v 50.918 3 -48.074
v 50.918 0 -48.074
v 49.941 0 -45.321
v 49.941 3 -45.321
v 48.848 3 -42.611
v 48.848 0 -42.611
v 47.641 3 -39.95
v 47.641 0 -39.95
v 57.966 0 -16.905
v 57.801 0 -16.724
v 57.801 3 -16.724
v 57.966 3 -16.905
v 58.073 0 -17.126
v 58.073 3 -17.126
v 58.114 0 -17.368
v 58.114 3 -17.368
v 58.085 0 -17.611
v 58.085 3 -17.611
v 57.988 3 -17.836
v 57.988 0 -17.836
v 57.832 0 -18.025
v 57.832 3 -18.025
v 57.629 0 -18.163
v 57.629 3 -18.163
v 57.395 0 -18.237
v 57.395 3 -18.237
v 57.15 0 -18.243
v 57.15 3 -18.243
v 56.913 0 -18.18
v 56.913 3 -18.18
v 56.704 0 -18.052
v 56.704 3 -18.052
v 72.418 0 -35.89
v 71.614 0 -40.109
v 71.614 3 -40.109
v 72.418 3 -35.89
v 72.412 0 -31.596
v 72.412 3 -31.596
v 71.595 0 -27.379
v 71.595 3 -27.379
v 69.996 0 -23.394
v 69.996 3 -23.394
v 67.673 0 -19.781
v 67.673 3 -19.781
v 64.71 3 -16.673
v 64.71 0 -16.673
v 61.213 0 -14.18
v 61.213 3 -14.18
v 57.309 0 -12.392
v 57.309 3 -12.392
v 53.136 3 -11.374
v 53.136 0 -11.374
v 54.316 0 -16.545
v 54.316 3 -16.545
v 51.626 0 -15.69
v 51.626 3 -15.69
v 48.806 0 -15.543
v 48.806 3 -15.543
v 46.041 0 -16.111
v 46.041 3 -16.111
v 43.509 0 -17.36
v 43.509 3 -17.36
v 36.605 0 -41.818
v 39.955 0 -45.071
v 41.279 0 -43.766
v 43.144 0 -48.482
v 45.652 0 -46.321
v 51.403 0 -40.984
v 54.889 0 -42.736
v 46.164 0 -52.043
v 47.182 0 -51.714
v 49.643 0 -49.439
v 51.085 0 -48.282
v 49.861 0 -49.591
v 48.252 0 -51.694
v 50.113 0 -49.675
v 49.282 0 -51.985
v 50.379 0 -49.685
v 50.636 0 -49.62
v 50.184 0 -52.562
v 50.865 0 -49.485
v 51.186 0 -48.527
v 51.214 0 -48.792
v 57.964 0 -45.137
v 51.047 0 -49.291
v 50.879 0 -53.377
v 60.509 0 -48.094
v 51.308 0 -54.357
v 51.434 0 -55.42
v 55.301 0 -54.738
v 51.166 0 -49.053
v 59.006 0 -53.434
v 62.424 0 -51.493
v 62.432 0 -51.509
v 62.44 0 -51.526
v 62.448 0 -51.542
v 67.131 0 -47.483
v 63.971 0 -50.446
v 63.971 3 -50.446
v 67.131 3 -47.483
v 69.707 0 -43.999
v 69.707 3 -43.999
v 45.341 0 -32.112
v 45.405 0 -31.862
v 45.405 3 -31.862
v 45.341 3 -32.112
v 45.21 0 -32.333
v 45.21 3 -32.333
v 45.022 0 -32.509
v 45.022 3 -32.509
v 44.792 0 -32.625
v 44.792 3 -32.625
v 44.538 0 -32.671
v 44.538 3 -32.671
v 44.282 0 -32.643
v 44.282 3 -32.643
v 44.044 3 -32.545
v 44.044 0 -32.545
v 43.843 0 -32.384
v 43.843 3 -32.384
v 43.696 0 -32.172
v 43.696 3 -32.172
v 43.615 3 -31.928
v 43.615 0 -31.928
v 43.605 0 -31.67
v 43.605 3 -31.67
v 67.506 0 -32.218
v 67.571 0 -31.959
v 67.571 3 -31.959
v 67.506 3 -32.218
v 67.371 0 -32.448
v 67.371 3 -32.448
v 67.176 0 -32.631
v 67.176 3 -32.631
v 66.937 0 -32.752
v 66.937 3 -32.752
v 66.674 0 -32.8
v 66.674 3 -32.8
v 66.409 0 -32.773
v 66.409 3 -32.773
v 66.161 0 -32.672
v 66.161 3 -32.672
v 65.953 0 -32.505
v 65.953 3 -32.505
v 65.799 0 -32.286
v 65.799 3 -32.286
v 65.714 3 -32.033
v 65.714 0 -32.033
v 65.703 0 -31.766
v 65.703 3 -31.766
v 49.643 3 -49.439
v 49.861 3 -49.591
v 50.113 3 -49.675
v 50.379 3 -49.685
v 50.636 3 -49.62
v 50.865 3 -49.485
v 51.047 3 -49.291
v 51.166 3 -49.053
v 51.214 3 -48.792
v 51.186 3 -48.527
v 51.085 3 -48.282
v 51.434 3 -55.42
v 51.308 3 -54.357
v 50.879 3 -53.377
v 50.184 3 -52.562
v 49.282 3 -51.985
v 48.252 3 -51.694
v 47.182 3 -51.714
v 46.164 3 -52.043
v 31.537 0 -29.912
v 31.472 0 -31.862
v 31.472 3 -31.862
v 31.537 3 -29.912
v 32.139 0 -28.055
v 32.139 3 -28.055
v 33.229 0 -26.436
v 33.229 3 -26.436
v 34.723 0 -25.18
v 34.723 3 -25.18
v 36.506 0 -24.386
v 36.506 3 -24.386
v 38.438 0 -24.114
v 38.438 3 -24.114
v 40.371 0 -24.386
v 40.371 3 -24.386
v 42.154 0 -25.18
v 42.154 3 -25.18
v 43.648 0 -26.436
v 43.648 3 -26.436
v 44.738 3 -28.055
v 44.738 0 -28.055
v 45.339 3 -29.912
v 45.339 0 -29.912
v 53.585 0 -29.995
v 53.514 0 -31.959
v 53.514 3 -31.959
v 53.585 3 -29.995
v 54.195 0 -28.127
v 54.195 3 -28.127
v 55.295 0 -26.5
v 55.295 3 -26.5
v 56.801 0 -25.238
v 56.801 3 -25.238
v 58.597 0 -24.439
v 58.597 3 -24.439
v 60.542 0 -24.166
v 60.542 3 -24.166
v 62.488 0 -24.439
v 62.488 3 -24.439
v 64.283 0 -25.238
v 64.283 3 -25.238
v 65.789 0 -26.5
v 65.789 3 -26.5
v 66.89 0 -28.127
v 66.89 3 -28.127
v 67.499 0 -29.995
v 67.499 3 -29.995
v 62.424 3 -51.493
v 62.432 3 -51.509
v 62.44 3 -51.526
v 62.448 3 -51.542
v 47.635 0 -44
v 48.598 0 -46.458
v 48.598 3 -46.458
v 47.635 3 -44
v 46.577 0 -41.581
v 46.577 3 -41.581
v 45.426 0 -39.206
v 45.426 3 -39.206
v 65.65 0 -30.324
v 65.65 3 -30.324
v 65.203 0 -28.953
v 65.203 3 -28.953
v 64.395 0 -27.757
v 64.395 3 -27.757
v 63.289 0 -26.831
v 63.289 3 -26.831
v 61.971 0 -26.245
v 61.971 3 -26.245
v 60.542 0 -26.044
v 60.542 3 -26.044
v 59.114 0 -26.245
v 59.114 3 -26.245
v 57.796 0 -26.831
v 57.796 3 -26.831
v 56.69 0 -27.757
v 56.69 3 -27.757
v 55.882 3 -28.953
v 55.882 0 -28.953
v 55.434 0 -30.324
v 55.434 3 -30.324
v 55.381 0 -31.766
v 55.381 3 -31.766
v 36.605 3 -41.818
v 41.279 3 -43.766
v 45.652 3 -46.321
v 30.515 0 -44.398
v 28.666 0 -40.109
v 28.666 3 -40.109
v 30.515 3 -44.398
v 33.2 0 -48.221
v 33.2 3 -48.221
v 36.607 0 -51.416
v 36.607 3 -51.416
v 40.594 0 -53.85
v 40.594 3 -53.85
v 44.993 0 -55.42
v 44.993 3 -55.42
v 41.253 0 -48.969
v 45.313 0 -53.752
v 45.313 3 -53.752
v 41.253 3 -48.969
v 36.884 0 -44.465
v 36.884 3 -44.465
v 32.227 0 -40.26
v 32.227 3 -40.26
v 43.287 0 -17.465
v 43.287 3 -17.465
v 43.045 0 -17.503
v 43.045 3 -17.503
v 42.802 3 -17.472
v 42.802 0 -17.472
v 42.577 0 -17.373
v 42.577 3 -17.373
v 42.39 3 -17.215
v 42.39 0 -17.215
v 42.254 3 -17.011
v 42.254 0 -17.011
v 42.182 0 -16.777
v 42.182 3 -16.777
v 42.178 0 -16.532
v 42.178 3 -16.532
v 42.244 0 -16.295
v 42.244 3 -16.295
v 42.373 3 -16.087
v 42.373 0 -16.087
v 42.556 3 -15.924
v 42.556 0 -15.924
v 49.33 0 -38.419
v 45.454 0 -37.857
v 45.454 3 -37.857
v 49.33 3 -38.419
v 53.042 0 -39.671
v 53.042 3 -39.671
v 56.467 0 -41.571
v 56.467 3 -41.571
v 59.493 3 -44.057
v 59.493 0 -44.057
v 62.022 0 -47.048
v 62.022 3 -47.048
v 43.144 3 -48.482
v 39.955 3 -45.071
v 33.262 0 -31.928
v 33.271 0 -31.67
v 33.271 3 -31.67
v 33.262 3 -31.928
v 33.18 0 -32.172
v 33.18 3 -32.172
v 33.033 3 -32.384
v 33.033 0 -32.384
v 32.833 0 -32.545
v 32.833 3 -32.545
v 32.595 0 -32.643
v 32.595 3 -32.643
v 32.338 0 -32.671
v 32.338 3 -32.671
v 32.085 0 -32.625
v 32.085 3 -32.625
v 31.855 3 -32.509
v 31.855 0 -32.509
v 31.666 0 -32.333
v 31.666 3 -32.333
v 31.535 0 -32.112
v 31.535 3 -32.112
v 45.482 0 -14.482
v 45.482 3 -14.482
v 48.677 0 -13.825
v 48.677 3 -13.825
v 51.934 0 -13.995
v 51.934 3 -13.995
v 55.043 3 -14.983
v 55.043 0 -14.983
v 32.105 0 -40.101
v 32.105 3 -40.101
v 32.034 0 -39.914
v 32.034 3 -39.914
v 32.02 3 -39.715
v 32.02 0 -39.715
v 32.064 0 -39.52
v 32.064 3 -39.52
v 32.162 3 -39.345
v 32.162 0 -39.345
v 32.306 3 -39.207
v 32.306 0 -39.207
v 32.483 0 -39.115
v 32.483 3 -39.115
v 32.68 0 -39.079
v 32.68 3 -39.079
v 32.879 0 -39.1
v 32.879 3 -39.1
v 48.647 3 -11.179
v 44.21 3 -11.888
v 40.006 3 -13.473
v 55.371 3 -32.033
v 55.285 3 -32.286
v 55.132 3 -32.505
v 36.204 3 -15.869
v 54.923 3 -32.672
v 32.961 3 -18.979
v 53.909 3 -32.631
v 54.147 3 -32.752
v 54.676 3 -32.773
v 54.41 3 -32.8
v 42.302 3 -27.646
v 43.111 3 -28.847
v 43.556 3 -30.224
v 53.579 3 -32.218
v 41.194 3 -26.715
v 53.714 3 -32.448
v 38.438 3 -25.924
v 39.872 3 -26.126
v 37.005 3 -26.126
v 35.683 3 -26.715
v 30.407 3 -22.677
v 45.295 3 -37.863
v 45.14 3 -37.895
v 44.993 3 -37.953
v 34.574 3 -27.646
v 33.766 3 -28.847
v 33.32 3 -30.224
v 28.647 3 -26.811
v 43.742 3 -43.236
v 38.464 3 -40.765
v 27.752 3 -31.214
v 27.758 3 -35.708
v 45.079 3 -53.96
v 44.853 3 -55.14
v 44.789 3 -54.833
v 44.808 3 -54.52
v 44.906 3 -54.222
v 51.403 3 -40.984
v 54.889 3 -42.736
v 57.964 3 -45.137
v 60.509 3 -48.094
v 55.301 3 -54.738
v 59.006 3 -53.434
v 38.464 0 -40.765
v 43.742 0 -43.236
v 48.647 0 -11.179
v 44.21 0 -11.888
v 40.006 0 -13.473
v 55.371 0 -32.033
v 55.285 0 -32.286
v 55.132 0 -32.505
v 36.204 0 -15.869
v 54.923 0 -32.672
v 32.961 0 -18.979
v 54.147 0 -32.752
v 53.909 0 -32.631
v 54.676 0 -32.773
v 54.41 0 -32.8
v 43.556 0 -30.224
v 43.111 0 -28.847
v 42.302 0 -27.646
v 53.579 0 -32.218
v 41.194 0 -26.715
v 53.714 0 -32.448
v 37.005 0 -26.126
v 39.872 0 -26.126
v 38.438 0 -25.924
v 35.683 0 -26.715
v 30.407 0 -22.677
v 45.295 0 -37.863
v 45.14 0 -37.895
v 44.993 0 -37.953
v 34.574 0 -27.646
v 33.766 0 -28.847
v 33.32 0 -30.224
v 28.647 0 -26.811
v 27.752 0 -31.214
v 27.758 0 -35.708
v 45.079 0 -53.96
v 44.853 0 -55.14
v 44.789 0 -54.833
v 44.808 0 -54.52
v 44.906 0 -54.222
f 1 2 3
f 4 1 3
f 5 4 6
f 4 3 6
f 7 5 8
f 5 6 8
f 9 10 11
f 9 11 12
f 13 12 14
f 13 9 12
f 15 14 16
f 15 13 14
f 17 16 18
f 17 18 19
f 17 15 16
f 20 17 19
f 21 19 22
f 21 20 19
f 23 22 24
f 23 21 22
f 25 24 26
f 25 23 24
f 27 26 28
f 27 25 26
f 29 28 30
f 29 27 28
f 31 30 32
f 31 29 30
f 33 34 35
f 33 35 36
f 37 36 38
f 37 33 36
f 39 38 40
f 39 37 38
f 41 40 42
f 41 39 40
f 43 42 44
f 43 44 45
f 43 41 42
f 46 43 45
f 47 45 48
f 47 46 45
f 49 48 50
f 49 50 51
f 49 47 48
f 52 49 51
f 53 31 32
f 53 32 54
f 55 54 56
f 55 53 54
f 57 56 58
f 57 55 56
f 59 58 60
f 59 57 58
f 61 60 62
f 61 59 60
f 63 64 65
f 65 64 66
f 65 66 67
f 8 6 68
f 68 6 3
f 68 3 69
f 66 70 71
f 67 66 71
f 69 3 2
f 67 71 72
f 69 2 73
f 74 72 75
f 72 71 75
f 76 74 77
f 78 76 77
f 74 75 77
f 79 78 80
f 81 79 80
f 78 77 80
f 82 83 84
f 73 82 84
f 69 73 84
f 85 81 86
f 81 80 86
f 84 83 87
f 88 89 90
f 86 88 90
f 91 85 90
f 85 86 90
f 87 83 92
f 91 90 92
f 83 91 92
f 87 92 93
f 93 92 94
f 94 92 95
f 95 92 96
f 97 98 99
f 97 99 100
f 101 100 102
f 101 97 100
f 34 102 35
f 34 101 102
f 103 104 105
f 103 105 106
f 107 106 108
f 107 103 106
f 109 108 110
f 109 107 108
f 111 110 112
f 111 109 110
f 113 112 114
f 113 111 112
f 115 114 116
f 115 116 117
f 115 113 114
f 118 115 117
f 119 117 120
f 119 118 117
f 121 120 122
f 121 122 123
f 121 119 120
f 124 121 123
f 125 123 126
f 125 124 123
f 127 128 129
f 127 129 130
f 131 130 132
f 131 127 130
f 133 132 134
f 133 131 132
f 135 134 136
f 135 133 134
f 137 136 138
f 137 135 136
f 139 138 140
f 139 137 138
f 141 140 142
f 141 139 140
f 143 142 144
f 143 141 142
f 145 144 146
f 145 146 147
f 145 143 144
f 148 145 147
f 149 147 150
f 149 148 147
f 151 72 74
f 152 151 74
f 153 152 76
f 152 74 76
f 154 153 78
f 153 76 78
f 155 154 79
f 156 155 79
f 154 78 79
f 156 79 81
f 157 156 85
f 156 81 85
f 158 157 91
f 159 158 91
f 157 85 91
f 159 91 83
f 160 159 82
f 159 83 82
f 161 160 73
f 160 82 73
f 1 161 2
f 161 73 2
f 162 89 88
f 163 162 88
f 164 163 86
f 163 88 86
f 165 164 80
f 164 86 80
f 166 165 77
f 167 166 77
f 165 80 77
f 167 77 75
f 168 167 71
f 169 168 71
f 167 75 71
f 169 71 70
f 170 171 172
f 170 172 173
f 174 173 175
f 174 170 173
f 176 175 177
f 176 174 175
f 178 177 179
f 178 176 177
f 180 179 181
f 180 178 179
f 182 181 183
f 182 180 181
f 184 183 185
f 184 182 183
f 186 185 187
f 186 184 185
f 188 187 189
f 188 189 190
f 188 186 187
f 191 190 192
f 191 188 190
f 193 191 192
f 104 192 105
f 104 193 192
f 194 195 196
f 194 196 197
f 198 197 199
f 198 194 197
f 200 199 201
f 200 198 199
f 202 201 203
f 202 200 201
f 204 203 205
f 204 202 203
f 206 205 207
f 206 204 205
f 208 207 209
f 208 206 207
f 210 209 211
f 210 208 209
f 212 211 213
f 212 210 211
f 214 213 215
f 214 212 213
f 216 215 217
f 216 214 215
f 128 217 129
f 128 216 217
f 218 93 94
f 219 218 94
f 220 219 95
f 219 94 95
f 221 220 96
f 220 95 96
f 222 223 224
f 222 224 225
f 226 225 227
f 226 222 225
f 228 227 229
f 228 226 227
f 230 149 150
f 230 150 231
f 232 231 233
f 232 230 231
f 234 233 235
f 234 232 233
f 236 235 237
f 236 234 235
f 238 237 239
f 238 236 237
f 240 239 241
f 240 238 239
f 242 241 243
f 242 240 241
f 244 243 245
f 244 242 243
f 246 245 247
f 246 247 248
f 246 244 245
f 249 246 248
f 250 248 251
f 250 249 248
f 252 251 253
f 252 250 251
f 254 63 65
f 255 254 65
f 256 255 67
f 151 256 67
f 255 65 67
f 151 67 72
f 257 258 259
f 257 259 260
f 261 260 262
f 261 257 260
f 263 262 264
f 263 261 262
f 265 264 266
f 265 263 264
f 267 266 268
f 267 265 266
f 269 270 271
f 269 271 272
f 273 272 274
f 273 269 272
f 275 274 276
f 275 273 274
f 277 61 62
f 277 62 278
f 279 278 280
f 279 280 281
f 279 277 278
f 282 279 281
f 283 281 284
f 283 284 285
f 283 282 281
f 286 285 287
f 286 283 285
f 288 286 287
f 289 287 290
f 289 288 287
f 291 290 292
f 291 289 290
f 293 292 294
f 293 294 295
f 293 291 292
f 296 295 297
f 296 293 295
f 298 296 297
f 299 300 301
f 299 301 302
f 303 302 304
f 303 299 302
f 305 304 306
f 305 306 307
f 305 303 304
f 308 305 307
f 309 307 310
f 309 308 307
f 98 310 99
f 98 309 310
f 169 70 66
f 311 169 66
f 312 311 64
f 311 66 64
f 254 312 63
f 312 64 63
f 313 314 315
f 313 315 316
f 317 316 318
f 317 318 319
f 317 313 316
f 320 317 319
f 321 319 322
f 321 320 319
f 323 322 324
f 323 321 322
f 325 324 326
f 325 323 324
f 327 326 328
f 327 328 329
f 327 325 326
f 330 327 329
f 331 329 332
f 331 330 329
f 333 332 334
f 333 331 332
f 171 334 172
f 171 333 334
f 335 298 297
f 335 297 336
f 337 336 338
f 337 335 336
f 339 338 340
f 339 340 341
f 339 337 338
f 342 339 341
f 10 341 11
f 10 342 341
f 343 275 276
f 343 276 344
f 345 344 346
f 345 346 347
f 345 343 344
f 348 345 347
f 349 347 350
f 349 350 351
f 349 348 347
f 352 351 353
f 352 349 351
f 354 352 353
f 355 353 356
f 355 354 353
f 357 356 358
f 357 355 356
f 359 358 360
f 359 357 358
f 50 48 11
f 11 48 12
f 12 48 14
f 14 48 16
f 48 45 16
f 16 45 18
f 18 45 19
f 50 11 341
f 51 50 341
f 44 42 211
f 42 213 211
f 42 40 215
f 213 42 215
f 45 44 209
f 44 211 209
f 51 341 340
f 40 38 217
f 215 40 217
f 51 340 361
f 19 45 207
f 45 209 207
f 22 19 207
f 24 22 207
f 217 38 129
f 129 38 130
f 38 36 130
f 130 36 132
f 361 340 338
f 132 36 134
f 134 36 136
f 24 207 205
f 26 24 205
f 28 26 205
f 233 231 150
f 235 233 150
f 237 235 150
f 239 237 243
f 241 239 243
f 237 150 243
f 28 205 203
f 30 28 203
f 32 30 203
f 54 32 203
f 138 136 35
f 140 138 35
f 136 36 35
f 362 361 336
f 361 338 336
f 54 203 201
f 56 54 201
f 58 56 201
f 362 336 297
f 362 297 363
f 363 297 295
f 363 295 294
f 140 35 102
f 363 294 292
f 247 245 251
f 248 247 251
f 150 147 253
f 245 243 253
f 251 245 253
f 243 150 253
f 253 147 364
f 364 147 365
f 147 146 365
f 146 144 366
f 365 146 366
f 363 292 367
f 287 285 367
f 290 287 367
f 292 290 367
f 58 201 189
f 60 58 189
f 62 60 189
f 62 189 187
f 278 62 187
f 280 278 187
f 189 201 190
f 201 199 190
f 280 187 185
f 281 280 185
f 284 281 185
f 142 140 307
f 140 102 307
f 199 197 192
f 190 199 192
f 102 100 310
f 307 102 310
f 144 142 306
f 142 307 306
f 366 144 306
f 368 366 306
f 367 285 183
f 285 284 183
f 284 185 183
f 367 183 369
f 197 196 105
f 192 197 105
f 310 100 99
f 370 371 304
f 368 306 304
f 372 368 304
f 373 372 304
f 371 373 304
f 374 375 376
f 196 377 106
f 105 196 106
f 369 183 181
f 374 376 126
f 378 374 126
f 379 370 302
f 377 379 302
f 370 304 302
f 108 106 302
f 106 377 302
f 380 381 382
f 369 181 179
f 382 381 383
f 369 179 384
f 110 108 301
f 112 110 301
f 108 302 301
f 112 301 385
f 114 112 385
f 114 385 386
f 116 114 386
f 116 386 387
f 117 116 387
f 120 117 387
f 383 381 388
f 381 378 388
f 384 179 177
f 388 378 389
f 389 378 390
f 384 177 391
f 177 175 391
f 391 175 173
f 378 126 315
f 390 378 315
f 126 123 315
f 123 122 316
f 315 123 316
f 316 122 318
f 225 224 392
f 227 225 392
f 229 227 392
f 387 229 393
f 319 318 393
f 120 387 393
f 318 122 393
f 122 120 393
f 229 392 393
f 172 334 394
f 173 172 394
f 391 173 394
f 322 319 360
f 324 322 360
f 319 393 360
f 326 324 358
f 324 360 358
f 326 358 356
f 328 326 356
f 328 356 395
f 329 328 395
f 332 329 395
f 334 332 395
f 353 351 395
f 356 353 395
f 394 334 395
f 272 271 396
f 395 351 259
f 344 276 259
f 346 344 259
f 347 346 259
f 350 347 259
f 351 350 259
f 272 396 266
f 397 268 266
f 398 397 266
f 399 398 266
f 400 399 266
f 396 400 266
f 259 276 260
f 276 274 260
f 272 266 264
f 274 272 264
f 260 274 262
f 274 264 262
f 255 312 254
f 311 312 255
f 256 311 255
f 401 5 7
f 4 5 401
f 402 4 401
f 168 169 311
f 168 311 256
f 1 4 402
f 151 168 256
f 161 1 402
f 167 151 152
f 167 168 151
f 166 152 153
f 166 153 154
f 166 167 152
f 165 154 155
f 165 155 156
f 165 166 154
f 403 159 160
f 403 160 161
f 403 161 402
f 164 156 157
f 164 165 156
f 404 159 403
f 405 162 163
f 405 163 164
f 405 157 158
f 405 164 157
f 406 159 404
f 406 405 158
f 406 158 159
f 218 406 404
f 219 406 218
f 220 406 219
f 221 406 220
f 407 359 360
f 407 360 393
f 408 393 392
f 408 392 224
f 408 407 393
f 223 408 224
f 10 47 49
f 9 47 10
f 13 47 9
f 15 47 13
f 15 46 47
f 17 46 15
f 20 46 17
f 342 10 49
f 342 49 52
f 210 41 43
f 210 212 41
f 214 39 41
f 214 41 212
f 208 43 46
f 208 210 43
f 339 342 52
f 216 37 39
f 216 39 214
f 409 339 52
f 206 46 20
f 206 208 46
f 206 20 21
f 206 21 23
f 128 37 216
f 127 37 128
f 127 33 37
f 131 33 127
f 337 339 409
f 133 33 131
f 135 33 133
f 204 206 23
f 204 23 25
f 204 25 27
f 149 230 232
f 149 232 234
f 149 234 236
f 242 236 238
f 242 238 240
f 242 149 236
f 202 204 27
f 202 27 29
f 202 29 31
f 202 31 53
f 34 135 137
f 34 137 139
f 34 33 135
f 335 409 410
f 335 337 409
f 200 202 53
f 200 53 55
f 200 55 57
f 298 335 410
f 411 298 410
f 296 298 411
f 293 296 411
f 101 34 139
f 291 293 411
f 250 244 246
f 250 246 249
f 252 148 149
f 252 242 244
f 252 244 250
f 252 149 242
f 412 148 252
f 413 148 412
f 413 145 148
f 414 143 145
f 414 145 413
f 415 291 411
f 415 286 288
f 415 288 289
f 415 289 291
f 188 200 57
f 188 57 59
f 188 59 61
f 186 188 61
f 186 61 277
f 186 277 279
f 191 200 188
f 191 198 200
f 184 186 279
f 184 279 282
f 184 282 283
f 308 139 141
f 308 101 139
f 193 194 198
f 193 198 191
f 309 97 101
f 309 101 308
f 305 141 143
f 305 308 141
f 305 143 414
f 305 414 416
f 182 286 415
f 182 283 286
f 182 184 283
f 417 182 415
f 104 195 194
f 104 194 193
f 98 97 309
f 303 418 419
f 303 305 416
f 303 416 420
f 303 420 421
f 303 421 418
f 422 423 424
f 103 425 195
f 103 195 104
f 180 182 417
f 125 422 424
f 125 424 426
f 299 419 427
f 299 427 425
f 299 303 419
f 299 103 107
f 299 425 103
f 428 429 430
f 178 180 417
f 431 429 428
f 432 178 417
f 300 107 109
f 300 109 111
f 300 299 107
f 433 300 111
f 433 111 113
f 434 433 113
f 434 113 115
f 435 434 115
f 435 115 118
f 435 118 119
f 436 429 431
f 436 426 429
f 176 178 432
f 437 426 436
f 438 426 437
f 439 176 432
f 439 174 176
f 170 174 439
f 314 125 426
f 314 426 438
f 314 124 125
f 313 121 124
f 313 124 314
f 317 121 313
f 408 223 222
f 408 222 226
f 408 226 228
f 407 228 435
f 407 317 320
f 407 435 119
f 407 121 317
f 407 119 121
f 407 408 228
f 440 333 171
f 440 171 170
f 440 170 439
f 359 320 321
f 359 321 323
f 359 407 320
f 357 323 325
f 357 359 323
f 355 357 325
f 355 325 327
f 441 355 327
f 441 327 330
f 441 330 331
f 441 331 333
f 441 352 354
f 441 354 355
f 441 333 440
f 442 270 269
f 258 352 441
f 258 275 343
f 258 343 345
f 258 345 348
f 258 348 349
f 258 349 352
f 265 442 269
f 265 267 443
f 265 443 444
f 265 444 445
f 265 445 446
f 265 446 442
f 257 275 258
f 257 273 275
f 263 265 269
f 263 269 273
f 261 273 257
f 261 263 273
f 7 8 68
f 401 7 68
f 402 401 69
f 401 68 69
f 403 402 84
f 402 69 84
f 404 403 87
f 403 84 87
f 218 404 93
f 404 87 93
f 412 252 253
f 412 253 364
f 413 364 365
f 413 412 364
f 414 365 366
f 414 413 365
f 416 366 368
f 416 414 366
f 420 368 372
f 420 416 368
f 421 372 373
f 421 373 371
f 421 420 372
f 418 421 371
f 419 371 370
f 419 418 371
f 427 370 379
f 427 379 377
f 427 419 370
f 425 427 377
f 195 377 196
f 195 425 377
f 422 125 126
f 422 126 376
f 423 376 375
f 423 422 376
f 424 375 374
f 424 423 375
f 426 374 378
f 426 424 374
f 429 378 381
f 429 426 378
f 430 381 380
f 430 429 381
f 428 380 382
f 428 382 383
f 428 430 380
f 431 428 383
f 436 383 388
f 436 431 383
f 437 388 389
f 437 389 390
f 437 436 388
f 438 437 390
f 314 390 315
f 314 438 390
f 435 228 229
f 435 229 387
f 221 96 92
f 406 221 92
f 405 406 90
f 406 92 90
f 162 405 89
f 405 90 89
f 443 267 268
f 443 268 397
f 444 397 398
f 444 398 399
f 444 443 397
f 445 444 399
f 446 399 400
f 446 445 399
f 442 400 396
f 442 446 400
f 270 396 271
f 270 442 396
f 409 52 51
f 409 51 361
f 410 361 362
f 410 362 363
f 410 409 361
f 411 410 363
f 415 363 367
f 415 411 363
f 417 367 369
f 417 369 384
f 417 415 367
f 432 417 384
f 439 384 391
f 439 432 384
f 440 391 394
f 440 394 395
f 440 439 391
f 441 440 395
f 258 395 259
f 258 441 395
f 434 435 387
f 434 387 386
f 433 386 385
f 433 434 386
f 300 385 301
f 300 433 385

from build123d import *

# Parameters (mm, degrees)
SALIENTE_EXTRUIR1_DEPTH   = 3
SALIENTE_EXTRUIR1_2_DEPTH = 3


with BuildPart() as part:
    # Croquis1 → Saliente-Extruir1 (new body)
    with BuildSketch(Plane(origin=(0, 0, 0), x_dir=(1, 0, 0), z_dir=(0, 1, 0))):
        with BuildLine():
            Line((45.425593016, 39.206344036), (44.993103459, 37.95333726))
            ThreePointArc((44.993103459, 37.95333726), (45.217239696, 37.87538969), (45.453858509, 37.857378194))
            ThreePointArc((45.453858509, 37.857378194), (56.466858378, 41.570973662), (63.970806845, 50.446091398))
            ThreePointArc((63.970806845, 50.446091398), (68.49783746, 45.799067947), (71.613505946, 40.108598457))
            ThreePointArc((71.613505946, 40.108598457), (68.920422337, 21.532290532), (53.136426633, 11.373678664))
            ThreePointArc((53.136426633, 11.373678664), (32.960940305, 18.979259272), (28.666044434, 40.108598457))
            ThreePointArc((28.666044434, 40.108598457), (34.821076063, 49.9061201), (44.993103459, 55.420256783))
            ThreePointArc((44.993103459, 55.420256783), (44.807683463, 54.519820522), (45.313276313, 53.7520042))
            ThreePointArc((45.313276313, 53.7520042), (39.105711287, 46.680393607), (32.227179127, 40.259542009))
            ThreePointArc((32.227179127, 40.259542009), (32.106258057, 39.428878951), (32.878756679, 39.10044494))
            ThreePointArc((32.878756679, 39.10044494), (41.148364583, 41.902874928), (48.597651163, 46.457889546))
            ThreePointArc((48.597651163, 46.457889546), (47.118213116, 42.785490463), (45.425593016, 39.206344036))
        make_face()
        with BuildLine():
            ThreePointArc((31.471767073, 31.862125217), (38.438273667, 24.114134575), (45.404780261, 31.862125217))
            ThreePointArc((45.404780261, 31.862125217), (44.409089735, 32.666113812), (43.60510114, 31.670423286))
            ThreePointArc((43.60510114, 31.670423286), (38.438273667, 25.923994948), (33.271446194, 31.670423286))
            ThreePointArc((33.271446194, 31.670423286), (32.467457599, 32.666113812), (31.471767073, 31.862125217))
        make_face(mode=Mode.SUBTRACT)
        with BuildLine():
            ThreePointArc((53.513579106, 31.958619171), (60.542287348, 24.166307285), (67.570995591, 31.958619171))
            ThreePointArc((67.570995591, 31.958619171), (66.540546849, 32.796080004), (65.703086016, 31.765631263))
            ThreePointArc((65.703086016, 31.765631263), (60.542287348, 26.044159919), (55.381488681, 31.765631263))
            ThreePointArc((55.381488681, 31.765631263), (54.544027848, 32.796080004), (53.513579106, 31.958619171))
        make_face(mode=Mode.SUBTRACT)
        with BuildLine():
            ThreePointArc((42.556430807, 15.924022523), (50.311008053, 13.805956585), (57.801408595, 16.723759063))
            ThreePointArc((57.801408595, 16.723759063), (57.916842518, 17.936511186), (56.704090395, 18.051945109))
            ThreePointArc((56.704090395, 18.051945109), (50.220753546, 15.526433126), (43.508757823, 17.359730941))
            ThreePointArc((43.508757823, 17.359730941), (42.314740106, 17.11804024), (42.556430807, 15.924022523))
        make_face(mode=Mode.SUBTRACT)
    extrude(amount=SALIENTE_EXTRUIR1_DEPTH)


with BuildPart() as body_2:
    # Croquis1 → Saliente-Extruir1 2 (new body)
    with BuildSketch(Plane(origin=(0, 0, 0), x_dir=(1, 0, 0), z_dir=(0, 1, 0))):
        with BuildLine():
            ThreePointArc((47.640867648, 39.950179711), (56.485714844, 43.860153446), (62.42425572, 51.492515388))
            ThreePointArc((62.42425572, 51.492515388), (62.435630847, 51.517356792), (62.447738759, 51.54184939))
            ThreePointArc((62.447738759, 51.54184939), (57.180344633, 54.161726438), (51.4335805, 55.420256783))
            ThreePointArc((51.4335805, 55.420256783), (49.75419333, 52.240495167), (46.163596362, 52.043420018))
            ThreePointArc((46.163596362, 52.043420018), (41.569805001, 46.757329696), (36.604580424, 41.818482171))
            ThreePointArc((36.604580424, 41.818482171), (43.508384082, 44.970402926), (49.642890368, 49.43861756))
            ThreePointArc((49.642890368, 49.43861756), (50.962800398, 49.394169945), (50.918352783, 48.074259915))
            ThreePointArc((50.918352783, 48.074259915), (49.408626903, 43.96017081), (47.640867648, 39.950179711))
        make_face()
    extrude(amount=SALIENTE_EXTRUIR1_2_DEPTH)


solid = Compound([part.part, body_2.part])
